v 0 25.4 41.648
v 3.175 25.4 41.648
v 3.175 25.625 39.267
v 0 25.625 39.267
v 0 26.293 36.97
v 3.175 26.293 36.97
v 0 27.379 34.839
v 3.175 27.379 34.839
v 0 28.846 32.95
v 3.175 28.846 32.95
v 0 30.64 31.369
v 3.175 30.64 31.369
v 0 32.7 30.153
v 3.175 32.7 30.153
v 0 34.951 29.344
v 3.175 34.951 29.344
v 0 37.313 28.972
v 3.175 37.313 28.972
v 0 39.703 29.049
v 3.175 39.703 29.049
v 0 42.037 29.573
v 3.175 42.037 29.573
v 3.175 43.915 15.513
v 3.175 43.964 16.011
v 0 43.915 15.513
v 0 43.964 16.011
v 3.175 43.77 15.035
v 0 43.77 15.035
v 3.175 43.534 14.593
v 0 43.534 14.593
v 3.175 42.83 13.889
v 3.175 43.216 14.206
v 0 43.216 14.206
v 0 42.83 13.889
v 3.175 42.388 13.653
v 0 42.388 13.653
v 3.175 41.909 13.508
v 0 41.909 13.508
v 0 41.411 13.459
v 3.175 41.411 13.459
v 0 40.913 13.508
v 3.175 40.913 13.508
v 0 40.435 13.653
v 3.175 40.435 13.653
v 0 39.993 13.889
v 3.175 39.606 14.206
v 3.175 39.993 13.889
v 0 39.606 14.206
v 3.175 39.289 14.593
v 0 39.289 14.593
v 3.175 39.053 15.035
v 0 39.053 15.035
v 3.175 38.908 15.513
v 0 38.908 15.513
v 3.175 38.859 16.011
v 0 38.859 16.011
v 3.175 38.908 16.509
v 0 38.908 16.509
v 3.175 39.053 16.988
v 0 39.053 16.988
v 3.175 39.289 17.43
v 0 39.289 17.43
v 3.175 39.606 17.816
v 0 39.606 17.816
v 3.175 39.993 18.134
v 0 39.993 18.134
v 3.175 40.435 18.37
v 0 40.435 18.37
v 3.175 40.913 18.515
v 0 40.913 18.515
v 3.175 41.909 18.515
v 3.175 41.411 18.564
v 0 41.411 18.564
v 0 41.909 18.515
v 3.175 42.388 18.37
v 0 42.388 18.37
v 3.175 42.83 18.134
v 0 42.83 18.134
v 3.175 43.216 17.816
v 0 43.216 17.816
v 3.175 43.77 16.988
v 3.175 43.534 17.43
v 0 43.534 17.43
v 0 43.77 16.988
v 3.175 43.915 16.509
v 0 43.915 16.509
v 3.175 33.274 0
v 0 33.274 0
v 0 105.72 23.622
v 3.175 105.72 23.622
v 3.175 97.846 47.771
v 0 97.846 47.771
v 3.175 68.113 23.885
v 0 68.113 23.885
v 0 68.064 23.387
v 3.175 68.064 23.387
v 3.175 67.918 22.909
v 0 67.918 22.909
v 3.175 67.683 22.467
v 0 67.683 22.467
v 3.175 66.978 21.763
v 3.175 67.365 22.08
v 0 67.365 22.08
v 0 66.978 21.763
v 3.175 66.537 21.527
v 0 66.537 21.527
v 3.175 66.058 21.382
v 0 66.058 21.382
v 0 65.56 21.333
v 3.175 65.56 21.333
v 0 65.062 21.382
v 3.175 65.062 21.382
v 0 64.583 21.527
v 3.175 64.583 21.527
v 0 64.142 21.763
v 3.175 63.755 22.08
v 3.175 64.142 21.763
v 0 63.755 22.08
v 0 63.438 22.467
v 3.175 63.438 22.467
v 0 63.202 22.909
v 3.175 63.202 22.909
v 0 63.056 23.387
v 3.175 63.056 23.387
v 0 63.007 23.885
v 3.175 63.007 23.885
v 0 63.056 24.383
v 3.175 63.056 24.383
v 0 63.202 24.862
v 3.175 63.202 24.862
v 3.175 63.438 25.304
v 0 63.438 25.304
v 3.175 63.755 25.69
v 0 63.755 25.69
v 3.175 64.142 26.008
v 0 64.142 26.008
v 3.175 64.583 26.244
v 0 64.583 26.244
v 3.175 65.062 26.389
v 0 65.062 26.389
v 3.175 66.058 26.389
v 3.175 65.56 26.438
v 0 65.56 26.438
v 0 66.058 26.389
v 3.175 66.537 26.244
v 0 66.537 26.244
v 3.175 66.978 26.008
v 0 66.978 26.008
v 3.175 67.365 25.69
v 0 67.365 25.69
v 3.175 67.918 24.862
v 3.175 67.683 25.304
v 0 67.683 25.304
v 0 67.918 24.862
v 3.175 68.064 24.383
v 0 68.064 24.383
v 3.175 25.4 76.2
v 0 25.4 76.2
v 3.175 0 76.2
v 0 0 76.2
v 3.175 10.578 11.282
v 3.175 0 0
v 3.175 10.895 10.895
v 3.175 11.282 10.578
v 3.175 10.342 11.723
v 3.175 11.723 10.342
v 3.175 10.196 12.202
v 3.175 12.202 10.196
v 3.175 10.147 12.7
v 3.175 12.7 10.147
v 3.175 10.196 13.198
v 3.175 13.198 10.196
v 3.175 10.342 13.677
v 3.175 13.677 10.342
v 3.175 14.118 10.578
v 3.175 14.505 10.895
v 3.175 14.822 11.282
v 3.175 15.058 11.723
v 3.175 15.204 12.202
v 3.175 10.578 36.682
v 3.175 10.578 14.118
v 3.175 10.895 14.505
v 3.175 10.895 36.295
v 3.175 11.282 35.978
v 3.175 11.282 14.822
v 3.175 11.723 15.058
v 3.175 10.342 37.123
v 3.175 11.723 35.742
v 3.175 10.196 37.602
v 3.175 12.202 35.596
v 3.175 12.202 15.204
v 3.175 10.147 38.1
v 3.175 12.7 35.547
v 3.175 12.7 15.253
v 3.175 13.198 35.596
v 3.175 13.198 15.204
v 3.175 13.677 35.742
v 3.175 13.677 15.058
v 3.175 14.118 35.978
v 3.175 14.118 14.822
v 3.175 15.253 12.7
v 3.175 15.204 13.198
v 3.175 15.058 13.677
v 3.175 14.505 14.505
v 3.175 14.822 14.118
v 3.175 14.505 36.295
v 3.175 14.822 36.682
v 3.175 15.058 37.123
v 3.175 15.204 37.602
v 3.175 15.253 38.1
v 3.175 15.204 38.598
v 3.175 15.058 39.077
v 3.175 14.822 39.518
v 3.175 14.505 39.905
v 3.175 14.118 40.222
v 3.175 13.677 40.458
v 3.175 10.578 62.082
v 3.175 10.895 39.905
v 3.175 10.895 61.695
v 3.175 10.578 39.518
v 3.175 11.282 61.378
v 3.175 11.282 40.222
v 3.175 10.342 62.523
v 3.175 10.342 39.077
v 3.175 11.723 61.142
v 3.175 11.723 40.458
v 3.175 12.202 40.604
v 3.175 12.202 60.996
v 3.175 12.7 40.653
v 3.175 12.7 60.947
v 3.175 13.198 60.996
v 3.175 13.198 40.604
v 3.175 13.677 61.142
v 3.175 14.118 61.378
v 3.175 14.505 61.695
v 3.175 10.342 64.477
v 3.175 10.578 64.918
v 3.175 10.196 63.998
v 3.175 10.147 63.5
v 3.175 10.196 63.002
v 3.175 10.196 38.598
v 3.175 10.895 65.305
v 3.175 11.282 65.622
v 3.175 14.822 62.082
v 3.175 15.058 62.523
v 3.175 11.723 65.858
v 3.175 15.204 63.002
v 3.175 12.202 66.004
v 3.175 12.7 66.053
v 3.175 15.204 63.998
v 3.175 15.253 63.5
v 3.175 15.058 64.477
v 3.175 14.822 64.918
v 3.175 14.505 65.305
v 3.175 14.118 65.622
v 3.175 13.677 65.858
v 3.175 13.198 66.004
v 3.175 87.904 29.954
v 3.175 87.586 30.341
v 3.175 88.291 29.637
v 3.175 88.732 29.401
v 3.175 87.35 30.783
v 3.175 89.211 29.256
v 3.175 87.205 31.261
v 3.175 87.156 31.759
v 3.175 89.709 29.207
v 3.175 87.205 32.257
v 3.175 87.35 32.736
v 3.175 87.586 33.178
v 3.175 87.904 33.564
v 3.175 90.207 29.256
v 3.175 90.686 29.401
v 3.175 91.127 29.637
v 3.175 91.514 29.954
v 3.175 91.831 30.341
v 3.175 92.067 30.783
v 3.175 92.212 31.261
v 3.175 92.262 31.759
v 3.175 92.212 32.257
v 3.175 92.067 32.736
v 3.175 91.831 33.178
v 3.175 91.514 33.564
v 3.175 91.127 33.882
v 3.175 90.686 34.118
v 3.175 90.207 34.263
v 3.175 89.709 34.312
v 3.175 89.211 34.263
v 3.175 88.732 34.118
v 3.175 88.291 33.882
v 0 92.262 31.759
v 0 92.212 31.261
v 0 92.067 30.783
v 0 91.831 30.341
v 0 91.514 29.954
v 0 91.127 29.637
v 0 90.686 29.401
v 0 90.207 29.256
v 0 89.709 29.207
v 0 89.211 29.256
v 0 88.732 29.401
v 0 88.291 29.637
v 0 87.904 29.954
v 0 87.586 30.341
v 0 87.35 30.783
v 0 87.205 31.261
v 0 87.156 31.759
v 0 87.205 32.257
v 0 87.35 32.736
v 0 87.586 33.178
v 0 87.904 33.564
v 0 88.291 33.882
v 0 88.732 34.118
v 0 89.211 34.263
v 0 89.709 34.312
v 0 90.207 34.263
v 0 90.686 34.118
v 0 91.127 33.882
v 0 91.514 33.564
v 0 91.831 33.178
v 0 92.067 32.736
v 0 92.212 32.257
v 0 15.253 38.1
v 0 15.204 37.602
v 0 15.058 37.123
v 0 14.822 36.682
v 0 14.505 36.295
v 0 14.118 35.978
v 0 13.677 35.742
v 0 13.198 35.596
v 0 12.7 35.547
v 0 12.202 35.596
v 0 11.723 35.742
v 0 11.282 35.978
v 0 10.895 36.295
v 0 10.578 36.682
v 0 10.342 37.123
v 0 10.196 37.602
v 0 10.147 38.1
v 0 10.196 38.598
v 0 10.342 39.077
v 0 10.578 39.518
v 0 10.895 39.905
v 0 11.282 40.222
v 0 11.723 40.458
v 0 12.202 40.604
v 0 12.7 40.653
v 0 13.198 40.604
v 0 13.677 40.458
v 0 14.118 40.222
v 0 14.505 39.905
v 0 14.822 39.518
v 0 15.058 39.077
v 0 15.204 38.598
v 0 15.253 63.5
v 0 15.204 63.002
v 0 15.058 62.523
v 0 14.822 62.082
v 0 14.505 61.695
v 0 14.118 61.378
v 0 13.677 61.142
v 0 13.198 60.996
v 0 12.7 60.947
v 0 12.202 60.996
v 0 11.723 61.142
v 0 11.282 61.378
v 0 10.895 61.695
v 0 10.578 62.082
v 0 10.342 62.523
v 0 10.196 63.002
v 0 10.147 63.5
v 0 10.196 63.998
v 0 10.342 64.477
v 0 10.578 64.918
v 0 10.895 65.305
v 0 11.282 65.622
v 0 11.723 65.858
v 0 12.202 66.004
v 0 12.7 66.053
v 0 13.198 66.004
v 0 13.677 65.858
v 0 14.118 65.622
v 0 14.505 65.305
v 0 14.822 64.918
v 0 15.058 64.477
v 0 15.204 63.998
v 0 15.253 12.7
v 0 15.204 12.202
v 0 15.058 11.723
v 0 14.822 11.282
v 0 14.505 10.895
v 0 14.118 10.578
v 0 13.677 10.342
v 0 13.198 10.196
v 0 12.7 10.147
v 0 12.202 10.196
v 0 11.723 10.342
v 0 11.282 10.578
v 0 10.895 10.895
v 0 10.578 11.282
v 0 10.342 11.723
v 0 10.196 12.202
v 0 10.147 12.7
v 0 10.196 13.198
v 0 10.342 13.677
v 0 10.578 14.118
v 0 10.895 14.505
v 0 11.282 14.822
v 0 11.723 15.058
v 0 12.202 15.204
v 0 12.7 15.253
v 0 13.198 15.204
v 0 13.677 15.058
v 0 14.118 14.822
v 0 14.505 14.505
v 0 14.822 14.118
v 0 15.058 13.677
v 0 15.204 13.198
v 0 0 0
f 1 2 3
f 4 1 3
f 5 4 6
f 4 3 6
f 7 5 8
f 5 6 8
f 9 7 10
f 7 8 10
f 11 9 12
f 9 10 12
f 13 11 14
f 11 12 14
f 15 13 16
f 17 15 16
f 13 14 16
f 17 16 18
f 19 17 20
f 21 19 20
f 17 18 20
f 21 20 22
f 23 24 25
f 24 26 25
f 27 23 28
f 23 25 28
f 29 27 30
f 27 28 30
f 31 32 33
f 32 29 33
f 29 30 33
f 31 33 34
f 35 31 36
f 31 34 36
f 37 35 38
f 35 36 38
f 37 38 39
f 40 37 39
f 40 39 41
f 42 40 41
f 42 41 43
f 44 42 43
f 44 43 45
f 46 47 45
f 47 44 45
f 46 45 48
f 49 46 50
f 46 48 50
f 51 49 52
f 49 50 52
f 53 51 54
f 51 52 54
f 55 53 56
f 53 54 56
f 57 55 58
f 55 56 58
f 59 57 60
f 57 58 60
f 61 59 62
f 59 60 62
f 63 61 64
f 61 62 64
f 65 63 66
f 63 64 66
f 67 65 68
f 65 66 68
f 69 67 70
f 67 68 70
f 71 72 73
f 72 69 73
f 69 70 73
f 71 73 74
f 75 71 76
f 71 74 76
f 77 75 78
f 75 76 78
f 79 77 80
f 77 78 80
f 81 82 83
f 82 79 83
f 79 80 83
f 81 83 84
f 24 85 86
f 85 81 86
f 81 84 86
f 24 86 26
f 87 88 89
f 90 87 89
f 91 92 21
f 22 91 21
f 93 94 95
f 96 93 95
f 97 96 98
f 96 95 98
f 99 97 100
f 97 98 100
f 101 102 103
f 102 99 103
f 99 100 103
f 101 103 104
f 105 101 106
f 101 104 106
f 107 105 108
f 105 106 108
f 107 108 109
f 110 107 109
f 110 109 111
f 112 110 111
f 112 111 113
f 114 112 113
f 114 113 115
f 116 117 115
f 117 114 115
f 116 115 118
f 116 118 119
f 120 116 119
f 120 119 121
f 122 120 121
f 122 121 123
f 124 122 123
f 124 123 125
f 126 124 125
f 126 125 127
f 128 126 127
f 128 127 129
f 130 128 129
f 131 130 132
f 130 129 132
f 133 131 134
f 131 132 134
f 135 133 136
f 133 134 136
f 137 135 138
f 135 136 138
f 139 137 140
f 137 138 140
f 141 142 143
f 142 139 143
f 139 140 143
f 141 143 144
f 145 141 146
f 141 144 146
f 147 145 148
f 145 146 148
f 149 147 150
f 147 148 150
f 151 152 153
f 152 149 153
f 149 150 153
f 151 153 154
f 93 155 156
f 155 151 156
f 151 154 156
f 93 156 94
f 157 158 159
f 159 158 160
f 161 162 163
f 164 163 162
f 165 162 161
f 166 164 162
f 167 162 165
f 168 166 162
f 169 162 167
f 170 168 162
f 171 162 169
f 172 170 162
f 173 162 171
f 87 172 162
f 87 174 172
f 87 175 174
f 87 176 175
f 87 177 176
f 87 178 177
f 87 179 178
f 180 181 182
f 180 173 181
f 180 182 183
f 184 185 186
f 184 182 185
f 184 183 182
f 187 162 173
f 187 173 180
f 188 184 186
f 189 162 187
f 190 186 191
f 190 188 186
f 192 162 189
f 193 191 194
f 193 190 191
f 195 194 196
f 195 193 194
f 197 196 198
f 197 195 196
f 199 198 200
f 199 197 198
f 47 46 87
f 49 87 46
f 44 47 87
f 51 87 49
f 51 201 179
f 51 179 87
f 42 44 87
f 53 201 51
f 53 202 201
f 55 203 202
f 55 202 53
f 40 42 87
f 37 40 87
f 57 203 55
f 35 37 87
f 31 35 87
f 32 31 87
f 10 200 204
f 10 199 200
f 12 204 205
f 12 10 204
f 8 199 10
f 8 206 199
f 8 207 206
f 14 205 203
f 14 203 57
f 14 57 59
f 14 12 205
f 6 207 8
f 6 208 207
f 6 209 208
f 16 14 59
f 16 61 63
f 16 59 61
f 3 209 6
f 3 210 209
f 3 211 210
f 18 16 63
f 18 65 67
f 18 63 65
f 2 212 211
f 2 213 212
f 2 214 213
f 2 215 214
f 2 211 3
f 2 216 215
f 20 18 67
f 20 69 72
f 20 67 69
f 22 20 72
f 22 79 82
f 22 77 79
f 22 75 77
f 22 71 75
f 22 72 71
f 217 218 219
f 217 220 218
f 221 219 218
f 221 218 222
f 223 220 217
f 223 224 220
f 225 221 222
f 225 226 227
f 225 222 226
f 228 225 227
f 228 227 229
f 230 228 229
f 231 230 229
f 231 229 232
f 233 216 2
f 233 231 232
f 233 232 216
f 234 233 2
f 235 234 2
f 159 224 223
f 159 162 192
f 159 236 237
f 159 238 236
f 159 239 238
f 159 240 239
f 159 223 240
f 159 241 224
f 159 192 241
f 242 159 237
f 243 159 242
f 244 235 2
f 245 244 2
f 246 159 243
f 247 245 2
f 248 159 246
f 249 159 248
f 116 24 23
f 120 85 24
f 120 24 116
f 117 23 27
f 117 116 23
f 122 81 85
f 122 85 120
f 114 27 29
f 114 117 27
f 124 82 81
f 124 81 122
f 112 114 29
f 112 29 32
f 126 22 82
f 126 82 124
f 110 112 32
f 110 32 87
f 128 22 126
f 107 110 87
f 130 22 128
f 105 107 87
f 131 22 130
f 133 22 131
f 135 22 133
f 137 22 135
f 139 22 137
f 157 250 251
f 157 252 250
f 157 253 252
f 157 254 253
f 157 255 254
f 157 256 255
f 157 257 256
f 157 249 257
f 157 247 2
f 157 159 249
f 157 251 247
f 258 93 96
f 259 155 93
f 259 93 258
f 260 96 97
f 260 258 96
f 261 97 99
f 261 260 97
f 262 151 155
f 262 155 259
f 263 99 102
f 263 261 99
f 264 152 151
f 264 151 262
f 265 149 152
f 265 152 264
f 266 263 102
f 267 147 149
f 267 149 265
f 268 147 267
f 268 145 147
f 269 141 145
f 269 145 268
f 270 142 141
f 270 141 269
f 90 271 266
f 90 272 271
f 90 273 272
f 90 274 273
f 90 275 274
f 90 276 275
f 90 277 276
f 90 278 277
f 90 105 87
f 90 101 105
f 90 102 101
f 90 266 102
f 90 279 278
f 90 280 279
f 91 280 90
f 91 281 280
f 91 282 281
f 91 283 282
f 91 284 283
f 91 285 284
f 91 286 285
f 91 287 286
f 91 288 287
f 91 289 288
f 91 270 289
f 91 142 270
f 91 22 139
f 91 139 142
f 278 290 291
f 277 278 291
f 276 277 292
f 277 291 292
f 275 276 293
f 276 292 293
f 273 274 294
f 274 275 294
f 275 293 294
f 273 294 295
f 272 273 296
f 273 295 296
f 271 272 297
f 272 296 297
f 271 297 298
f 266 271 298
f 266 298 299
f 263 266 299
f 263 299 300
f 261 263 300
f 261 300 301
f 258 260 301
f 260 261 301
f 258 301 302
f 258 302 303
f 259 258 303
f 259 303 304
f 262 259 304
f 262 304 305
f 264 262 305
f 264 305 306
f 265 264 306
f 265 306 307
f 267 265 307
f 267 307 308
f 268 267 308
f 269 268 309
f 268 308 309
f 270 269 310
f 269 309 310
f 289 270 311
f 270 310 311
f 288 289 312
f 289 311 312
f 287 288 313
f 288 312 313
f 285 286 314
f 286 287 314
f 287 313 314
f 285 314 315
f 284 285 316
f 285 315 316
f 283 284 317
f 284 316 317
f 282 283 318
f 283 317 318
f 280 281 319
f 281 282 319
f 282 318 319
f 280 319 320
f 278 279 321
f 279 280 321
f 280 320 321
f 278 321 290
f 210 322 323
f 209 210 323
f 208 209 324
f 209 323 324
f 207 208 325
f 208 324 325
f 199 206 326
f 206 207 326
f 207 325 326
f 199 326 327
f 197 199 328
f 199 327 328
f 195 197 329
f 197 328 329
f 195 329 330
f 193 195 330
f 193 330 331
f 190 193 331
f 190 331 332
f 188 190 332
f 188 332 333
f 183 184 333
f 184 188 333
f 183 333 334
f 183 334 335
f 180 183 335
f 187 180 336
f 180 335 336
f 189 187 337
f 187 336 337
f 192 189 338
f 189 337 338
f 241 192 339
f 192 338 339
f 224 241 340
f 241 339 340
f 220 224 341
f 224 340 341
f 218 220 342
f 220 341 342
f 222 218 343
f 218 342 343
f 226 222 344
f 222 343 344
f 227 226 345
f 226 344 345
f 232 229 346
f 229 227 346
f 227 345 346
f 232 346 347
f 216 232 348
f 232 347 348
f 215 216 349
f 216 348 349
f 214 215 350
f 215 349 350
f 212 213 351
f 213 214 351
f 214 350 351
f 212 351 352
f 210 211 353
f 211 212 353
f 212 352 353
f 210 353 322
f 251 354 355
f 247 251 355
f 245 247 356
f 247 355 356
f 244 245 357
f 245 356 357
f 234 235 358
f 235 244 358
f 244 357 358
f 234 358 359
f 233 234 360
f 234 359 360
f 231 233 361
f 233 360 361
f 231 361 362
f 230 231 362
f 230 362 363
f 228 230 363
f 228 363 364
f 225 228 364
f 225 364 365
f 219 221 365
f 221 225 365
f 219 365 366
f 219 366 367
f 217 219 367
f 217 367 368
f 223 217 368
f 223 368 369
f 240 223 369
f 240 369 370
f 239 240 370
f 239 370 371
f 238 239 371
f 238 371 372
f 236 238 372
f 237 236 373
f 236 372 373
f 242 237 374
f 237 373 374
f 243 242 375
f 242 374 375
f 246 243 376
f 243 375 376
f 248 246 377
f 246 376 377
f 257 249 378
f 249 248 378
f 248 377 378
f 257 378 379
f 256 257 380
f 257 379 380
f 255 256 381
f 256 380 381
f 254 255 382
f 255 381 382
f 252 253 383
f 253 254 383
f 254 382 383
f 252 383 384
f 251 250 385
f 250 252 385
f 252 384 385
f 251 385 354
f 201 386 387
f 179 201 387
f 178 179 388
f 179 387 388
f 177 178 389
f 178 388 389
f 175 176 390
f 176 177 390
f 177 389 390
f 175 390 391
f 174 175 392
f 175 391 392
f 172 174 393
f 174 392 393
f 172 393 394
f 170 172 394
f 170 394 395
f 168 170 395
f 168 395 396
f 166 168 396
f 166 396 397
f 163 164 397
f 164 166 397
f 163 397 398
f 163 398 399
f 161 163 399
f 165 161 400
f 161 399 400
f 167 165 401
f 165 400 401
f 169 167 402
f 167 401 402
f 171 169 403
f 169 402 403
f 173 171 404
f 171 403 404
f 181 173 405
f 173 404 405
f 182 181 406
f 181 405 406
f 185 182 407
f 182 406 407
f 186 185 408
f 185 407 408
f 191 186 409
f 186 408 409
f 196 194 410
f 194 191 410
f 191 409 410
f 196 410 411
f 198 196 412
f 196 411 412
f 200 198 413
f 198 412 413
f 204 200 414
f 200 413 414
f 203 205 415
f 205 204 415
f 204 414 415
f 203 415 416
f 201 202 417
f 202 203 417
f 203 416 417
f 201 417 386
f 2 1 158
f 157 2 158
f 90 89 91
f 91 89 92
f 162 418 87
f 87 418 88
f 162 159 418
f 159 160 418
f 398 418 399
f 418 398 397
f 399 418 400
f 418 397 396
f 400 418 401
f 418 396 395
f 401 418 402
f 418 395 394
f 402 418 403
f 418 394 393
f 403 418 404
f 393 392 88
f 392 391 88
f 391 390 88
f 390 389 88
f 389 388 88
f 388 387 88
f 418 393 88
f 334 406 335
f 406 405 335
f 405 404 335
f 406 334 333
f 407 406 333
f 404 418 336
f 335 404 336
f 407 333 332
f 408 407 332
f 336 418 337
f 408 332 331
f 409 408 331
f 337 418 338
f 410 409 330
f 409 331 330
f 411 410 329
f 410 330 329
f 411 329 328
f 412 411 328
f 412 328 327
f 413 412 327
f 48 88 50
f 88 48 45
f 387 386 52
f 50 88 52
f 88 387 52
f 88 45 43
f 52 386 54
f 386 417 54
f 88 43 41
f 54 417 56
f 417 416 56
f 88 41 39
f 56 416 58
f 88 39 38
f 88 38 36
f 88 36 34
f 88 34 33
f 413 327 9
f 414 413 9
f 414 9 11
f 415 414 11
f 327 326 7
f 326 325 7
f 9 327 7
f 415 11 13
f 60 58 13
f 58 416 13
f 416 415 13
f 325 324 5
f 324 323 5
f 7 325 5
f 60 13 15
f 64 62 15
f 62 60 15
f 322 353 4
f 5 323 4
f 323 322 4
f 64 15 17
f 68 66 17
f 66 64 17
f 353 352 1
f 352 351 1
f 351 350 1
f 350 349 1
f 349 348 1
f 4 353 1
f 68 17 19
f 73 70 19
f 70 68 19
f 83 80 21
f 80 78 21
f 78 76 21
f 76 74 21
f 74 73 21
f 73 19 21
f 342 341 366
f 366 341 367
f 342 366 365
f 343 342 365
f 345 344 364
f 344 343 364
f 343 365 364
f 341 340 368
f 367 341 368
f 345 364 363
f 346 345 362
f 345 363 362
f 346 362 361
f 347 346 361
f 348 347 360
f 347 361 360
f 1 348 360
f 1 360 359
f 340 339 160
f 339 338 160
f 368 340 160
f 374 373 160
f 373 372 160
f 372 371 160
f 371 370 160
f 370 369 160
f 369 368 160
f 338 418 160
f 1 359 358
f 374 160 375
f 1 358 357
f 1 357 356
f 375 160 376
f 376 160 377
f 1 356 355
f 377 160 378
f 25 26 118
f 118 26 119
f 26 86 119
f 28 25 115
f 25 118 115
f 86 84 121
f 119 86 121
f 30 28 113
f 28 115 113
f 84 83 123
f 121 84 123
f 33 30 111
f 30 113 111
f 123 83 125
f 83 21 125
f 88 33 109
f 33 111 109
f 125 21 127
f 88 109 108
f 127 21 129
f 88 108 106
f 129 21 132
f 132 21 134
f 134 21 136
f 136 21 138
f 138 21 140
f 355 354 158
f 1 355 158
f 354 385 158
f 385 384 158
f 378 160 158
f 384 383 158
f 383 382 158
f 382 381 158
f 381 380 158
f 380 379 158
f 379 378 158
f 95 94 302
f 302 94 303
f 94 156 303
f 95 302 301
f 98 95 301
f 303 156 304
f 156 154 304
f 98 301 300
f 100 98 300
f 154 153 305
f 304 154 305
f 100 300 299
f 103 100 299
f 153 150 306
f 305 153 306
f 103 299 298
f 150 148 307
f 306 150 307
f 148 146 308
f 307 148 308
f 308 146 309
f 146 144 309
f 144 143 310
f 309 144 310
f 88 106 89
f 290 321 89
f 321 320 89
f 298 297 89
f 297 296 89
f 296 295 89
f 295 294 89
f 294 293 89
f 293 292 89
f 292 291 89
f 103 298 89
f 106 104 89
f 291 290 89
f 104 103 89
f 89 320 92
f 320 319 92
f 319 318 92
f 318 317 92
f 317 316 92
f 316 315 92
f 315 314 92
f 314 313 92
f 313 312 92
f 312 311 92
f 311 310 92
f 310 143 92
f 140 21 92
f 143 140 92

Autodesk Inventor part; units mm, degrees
ref_plane "YZ Plane" through (0, 0, 0) normal (1, 0, 0) x (0, 1, 0)
ref_plane "XZ Plane" through (0, 0, 0) normal (0, 1, 0) x (-1, 0, 0)
ref_plane "XY Plane" through (0, 0, 0) normal (0, 0, 1) x (1, 0, 0)
sketch "Sketch1" plane through (0, 0, 0) normal (1, 0, 0) x (0, 1, 0)
  line L0 (0, 0) -> (25.4, 0)
  line L1 (25.4, 0) -> (25.4, 76.2)
  line L2 (25.4, 76.2) -> (0, 76.2)
  line L3 (0, 76.2) -> (0, 0)
  line L4 (25.4, 0) -> (33.274, 0)
  line L5 (33.274, 0) -> (105.7201, 23.622)
  line L6 (105.7201, 23.622) -> (97.8461, 47.7707)
  line L7 (97.8461, 47.7707) -> (25.4, 24.1487)
  circle A0 centre (41.4114, 16.0114) radius 2.5527
  circle A1 centre (12.7, 12.7) radius 2.5527
  line L8 (25.4, 24.1487) -> (33.274, 0)
  circle A2 centre (12.7, 38.1) radius 2.5527
  circle A3 centre (12.7, 63.5) radius 2.5527
  circle A4 centre (65.5601, 23.8854) radius 2.5527
  circle A5 centre (89.7088, 31.7594) radius 2.5527
  point P0 (12.7, 0)
  dimension "d0" = 25.4
  dimension "d1" = 76.2
  dimension "d2" = 7.874
  dimension "d3" = 76.2
  dimension "d4" = 25.4
  dimension "d5" = 5.1054
  dimension "d6" = 5.1054
  dimension "d7" = 12.7
  dimension "d8" = 12.7
  dimension "d9" = 12.7
  dimension "d10" = 12.7
  dimension "d20" = 25.4
  dimension "d27" = 25.4
extrude "Extrusion1" add sketch "Sketch1" along normal blind 3.175
fillet "Fillet1" radius 12.7 1 edges at (1.5875, 25.4, 24.1487)
properties part number "Bot_ang_gus"
